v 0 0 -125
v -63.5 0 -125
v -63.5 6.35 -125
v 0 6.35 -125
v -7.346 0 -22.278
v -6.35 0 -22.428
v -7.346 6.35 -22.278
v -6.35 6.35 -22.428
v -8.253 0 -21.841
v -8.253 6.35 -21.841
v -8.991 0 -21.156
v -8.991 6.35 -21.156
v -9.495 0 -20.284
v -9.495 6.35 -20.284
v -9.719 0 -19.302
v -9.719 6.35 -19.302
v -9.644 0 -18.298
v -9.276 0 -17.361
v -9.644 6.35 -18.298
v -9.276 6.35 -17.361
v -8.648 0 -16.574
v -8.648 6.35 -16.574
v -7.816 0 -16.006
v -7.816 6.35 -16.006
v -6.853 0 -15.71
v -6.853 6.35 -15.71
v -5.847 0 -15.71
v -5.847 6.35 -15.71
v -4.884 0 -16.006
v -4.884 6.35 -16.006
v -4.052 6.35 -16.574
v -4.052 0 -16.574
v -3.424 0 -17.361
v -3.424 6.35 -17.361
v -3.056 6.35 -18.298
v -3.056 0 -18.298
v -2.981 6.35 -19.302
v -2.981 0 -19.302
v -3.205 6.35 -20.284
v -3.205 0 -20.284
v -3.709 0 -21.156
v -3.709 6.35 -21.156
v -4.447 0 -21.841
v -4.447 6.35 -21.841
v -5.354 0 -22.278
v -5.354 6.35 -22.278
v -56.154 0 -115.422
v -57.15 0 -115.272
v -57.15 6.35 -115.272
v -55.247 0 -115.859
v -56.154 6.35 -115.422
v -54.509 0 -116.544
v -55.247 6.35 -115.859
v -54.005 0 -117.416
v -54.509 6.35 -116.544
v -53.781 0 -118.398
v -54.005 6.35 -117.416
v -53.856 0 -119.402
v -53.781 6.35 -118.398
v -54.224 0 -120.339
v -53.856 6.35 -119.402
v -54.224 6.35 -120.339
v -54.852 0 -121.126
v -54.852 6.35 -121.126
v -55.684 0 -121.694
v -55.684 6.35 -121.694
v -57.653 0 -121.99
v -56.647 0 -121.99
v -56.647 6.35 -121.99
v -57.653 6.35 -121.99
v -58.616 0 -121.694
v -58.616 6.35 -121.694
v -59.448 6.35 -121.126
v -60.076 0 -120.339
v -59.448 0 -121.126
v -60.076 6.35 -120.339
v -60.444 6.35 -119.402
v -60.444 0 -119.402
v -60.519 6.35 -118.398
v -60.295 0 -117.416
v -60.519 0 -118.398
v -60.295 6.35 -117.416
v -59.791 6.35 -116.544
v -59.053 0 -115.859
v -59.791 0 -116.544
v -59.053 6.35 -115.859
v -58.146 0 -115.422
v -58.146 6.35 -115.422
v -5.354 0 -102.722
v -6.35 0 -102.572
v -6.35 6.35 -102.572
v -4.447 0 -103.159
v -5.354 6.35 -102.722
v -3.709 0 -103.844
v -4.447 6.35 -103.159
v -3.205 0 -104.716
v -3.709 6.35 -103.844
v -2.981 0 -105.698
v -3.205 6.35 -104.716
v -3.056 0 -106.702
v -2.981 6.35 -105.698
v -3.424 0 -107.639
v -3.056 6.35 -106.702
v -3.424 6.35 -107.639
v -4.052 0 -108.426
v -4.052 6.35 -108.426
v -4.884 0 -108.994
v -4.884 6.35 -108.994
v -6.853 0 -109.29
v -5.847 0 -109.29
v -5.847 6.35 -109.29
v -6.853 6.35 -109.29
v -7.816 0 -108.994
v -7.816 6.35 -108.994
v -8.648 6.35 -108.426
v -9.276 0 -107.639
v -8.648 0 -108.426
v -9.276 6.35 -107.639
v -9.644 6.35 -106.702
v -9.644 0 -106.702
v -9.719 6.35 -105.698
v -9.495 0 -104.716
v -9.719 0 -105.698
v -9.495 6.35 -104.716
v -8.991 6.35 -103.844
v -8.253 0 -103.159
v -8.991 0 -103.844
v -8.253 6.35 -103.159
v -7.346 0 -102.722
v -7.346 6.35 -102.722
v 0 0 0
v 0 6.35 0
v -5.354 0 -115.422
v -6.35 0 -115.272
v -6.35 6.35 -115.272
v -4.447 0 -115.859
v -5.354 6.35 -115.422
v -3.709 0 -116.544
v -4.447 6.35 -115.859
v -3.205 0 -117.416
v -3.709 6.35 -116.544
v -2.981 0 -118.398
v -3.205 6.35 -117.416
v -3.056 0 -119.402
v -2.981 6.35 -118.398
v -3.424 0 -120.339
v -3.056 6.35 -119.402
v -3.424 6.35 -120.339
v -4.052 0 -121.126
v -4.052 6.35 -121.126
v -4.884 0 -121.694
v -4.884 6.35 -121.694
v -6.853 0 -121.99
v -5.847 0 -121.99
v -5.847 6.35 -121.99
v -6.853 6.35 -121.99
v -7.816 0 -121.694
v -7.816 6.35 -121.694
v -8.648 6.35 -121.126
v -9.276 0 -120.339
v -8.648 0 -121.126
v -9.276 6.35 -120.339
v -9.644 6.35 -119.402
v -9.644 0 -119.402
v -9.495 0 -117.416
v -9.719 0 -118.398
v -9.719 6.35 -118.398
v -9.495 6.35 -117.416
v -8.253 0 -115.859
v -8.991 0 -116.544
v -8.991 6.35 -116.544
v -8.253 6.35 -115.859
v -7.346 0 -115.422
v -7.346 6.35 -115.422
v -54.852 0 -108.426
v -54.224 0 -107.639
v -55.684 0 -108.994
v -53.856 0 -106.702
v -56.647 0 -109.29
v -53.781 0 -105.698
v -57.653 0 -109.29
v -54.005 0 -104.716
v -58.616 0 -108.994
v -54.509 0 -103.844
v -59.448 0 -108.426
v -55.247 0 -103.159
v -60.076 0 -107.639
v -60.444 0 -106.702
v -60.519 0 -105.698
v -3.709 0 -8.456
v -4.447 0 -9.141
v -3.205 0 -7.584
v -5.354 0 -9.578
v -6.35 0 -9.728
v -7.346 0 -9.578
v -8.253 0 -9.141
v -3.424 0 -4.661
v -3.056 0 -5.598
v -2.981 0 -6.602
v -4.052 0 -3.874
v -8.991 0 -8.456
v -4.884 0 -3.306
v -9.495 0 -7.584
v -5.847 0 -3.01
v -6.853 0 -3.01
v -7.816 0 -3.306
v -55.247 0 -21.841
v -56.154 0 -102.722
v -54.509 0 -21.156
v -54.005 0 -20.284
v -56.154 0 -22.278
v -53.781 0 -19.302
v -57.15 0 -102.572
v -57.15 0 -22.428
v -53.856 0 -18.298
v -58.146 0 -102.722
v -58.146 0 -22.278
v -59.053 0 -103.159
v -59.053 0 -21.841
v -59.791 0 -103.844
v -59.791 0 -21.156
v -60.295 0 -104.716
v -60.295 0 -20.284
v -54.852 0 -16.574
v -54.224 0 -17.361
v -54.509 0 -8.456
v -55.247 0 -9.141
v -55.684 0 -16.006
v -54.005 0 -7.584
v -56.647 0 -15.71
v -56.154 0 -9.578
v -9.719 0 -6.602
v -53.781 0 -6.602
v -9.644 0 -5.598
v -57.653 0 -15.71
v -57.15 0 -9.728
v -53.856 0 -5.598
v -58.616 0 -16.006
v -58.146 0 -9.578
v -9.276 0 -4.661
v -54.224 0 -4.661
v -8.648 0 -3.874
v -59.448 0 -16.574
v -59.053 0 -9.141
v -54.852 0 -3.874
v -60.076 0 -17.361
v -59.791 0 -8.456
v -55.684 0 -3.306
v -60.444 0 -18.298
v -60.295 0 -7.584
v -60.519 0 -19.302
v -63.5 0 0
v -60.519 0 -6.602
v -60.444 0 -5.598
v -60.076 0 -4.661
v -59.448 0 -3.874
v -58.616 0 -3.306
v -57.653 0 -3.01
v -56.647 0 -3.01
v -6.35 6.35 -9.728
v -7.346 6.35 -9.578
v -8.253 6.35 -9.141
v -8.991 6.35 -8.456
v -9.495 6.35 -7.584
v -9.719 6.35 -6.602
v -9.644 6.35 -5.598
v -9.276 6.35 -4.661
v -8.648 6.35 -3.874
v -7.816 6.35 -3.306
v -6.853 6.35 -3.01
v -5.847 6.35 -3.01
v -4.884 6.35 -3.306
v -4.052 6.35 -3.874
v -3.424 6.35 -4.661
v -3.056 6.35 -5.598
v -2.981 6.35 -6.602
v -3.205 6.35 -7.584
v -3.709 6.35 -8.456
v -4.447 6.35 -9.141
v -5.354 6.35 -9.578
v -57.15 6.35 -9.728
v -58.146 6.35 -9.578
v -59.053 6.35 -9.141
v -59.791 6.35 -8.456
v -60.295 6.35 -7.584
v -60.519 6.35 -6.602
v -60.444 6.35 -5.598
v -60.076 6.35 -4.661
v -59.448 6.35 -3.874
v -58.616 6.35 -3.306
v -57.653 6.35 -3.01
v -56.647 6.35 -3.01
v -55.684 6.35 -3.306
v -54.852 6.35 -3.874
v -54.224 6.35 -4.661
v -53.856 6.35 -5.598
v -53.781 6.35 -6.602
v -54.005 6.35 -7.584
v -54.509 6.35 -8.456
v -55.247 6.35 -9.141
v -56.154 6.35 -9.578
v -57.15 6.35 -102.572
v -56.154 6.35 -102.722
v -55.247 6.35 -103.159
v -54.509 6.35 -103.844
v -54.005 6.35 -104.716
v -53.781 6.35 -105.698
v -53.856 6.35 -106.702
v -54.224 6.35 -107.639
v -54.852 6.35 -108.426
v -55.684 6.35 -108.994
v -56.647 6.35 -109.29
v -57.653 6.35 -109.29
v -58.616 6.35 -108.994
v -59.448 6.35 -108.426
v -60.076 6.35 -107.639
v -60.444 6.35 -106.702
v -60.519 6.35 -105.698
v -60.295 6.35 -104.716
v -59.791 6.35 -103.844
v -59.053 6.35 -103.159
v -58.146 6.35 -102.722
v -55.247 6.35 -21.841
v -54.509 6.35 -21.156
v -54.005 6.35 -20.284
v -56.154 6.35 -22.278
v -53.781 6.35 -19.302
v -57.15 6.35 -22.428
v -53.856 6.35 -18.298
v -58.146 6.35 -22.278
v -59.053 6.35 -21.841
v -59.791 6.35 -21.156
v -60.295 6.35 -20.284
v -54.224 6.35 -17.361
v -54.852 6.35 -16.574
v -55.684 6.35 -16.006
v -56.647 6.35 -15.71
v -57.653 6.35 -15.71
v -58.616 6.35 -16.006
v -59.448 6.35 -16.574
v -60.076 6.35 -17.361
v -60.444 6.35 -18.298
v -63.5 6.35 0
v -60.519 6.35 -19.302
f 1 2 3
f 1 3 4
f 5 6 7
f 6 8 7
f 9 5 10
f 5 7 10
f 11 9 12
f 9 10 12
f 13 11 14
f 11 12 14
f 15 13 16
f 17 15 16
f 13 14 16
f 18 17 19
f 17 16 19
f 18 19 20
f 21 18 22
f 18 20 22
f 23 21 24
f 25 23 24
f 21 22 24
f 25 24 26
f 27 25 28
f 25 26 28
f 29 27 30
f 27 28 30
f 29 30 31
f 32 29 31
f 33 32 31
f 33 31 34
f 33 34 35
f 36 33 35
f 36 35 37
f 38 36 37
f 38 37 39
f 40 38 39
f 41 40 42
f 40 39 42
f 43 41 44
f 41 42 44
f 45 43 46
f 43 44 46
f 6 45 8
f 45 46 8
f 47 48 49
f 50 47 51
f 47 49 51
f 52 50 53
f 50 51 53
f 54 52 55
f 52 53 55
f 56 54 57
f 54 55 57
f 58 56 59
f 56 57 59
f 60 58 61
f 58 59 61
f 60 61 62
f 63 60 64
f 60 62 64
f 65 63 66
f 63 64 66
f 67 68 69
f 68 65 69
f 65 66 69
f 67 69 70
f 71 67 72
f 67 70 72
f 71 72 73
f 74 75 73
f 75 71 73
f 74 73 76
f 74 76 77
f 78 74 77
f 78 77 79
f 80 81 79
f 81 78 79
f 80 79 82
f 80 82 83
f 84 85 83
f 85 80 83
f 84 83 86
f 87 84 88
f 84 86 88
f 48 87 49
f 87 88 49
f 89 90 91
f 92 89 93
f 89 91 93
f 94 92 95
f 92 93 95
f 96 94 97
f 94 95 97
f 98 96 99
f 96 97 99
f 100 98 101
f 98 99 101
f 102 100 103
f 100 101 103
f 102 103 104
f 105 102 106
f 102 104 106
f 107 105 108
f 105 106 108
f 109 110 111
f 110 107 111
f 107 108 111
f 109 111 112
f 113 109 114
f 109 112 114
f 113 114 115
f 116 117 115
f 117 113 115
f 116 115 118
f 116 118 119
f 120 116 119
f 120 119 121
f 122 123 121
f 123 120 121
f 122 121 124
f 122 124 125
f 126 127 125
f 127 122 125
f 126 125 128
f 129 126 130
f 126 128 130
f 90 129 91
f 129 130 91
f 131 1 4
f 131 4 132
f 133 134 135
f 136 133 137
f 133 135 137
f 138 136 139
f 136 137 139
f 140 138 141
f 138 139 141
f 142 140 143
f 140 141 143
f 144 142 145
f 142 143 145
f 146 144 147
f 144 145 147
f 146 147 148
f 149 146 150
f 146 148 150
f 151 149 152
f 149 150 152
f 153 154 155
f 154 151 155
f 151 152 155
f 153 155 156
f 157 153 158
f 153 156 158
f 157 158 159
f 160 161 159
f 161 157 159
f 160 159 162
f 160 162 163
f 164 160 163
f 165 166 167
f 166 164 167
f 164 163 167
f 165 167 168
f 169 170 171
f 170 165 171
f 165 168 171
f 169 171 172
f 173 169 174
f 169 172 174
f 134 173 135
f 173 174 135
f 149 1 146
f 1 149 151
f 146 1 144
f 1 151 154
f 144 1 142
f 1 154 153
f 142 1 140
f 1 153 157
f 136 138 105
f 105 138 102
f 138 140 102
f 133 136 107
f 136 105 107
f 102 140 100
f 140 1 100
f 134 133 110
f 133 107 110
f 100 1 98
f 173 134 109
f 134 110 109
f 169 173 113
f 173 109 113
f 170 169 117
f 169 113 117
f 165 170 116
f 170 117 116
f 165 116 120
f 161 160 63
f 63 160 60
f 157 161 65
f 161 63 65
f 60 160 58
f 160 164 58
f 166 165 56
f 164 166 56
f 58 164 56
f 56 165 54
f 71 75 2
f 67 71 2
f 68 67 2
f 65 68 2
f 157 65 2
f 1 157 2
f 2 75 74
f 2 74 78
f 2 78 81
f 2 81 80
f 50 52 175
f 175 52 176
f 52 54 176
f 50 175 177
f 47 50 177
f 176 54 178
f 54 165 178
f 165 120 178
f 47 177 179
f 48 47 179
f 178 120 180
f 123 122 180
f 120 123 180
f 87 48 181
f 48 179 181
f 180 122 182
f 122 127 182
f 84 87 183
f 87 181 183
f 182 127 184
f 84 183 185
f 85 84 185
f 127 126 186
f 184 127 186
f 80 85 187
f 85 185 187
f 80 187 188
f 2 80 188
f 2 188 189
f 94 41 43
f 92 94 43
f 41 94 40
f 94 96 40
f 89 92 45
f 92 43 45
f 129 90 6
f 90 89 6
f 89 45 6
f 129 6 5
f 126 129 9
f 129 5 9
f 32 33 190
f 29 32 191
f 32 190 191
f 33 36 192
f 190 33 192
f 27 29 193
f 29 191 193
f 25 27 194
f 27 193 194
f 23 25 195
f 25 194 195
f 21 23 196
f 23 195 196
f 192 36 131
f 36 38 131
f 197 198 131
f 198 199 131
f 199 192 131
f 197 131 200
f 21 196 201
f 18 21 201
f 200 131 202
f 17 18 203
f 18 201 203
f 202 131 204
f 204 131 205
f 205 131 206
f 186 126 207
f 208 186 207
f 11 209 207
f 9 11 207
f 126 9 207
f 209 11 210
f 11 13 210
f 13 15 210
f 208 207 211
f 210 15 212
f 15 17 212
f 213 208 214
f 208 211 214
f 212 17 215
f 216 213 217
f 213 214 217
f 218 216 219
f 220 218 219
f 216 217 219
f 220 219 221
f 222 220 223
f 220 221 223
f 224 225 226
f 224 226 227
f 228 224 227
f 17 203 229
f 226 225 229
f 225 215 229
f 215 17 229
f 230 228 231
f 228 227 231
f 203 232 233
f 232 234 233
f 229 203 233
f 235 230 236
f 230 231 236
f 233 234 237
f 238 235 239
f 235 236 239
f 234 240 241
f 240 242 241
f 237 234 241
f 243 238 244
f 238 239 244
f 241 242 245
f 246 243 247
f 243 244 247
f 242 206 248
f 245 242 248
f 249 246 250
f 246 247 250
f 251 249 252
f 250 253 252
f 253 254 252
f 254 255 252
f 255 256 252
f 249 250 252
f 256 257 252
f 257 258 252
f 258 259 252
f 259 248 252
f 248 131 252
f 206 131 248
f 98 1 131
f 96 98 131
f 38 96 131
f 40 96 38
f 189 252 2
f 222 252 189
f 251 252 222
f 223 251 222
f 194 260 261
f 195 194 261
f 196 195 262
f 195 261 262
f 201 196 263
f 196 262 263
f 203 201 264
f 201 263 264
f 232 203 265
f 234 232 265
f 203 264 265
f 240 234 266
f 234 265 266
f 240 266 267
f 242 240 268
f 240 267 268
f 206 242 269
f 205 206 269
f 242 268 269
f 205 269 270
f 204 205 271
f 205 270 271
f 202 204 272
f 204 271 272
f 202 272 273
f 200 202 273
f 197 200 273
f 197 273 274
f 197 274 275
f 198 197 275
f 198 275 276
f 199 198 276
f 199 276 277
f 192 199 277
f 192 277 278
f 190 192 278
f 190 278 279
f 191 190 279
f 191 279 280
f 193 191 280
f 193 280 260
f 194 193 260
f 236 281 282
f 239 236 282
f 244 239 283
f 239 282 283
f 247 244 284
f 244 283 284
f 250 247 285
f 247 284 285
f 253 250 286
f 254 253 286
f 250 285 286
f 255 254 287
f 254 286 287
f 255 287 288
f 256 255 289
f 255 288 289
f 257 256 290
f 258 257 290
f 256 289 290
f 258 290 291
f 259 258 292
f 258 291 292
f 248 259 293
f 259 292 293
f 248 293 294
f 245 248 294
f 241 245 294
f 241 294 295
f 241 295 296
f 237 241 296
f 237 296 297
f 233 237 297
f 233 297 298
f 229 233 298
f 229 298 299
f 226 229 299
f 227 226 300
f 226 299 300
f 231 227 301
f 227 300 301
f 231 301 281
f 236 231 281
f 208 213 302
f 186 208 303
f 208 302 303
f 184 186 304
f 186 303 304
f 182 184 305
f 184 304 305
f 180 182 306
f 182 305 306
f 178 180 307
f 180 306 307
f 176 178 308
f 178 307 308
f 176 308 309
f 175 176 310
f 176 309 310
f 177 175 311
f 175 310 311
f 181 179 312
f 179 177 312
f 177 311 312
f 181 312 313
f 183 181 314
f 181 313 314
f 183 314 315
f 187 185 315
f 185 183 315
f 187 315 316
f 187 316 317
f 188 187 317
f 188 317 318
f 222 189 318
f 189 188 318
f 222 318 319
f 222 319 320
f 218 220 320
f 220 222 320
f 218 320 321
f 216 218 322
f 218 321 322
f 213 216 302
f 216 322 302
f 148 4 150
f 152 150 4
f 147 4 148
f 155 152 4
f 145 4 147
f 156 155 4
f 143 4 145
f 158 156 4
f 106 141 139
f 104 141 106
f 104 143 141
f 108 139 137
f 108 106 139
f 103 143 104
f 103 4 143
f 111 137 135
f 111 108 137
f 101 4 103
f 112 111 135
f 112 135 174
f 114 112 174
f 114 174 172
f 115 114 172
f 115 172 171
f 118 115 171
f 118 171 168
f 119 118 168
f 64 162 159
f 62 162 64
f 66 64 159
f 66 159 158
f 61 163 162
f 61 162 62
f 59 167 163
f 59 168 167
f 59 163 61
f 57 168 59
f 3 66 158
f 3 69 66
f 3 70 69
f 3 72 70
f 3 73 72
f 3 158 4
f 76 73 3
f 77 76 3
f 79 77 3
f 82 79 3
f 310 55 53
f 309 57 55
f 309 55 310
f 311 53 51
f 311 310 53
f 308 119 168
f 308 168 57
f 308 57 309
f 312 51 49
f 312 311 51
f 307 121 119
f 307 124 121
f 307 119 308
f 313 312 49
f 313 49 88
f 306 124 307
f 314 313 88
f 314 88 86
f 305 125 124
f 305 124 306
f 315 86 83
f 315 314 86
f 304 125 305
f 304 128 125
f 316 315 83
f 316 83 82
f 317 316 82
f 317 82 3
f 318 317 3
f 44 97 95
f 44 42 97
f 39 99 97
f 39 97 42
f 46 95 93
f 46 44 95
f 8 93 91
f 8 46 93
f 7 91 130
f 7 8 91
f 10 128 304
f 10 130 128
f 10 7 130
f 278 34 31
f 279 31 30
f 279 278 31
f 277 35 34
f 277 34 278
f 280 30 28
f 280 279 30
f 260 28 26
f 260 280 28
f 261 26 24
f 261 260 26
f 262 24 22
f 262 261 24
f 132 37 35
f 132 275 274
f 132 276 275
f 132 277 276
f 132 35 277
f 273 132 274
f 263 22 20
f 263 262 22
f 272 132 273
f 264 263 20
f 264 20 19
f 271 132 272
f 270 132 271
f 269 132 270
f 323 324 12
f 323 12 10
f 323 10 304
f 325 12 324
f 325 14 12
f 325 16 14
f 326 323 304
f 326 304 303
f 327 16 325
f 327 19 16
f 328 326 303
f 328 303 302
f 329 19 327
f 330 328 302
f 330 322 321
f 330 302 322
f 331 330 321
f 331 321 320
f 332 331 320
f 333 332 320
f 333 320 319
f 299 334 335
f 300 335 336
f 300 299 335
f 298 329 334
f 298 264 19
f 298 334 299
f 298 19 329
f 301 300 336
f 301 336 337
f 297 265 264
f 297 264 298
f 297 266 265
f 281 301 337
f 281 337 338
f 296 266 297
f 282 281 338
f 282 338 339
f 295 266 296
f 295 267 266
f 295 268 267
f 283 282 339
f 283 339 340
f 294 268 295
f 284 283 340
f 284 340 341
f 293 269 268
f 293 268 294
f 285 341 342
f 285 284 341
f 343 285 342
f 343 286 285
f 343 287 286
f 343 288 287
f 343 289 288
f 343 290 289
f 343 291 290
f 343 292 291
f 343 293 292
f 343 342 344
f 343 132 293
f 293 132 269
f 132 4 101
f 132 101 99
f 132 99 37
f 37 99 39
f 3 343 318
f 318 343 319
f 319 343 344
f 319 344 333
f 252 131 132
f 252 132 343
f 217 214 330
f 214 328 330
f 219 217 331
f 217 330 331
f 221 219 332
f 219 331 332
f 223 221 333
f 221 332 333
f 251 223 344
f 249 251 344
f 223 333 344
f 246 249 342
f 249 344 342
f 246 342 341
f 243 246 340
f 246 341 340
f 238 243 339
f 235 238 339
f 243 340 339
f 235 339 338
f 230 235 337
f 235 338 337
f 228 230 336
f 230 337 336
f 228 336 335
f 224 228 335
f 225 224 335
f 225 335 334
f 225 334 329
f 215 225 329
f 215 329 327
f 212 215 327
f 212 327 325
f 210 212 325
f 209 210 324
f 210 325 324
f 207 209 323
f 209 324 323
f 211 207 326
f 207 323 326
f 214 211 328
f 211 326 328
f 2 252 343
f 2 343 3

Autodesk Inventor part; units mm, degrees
ref_plane "YZ Plane" through (0, 0, 0) normal (1, 0, 0) x (0, 1, 0)
ref_plane "XZ Plane" through (0, 0, 0) normal (0, 1, 0) x (-1, 0, 0)
ref_plane "XY Plane" through (0, 0, 0) normal (0, 0, 1) x (1, 0, 0)
sketch "Sketch1" plane through (0, 0, 0) normal (0, 1, 0) x (-1, 0, 0)
  line L0 (0, 0) -> (63.5, 0)
  line L1 (63.5, 0) -> (63.5, -125)
  line L2 (63.5, -125) -> (0, -125)
  line L3 (0, -125) -> (0, 0)
  line L4 (63.5, 0) -> (63.5, -6.35)
  line L5 (63.5, -6.35) -> (31.75, -6.35)
  line L6 (31.75, -6.35) -> (57.15, -6.35)
  line L7 (31.75, -6.35) -> (6.35, -6.35)
  line L8 (6.35, -6.35) -> (6.35, -19.05)
  line L9 (57.15, -6.35) -> (57.15, -19.05)
  dimension "d0" = 125
  dimension "d1" = 6.35
  dimension "d2" = 25.4
  dimension "d3" = 63.5
  dimension "d4" = 31.75
  dimension "d5" = 25.4
  dimension "d6" = 12.7
  dimension "d7" = 12.7
extrude "Extrusion1" add sketch "Sketch1" along normal blind 6.35
hole "Hole1" at (-6.35, 0, -6.35) at (-6.35, 0, -19.05) at (-57.15, 0, -6.35) at (-57.15, 0, -19.05) direction (0, 1, 0) diameter 6.7564 end through all clearance for "Socket Head Cap Screw" size "1/4" standard "Ansi Unified Screw Threads"
ref_plane "Work Plane1" through (0, 6.35, -62.5) normal (0, 0, 1) x (1, 0, 0)
mirror "Mirror1" about plane through (0, 6.35, -62.5) normal (0, 0, 1) of "Hole1"
properties part number "USAXS Rail Extender"
